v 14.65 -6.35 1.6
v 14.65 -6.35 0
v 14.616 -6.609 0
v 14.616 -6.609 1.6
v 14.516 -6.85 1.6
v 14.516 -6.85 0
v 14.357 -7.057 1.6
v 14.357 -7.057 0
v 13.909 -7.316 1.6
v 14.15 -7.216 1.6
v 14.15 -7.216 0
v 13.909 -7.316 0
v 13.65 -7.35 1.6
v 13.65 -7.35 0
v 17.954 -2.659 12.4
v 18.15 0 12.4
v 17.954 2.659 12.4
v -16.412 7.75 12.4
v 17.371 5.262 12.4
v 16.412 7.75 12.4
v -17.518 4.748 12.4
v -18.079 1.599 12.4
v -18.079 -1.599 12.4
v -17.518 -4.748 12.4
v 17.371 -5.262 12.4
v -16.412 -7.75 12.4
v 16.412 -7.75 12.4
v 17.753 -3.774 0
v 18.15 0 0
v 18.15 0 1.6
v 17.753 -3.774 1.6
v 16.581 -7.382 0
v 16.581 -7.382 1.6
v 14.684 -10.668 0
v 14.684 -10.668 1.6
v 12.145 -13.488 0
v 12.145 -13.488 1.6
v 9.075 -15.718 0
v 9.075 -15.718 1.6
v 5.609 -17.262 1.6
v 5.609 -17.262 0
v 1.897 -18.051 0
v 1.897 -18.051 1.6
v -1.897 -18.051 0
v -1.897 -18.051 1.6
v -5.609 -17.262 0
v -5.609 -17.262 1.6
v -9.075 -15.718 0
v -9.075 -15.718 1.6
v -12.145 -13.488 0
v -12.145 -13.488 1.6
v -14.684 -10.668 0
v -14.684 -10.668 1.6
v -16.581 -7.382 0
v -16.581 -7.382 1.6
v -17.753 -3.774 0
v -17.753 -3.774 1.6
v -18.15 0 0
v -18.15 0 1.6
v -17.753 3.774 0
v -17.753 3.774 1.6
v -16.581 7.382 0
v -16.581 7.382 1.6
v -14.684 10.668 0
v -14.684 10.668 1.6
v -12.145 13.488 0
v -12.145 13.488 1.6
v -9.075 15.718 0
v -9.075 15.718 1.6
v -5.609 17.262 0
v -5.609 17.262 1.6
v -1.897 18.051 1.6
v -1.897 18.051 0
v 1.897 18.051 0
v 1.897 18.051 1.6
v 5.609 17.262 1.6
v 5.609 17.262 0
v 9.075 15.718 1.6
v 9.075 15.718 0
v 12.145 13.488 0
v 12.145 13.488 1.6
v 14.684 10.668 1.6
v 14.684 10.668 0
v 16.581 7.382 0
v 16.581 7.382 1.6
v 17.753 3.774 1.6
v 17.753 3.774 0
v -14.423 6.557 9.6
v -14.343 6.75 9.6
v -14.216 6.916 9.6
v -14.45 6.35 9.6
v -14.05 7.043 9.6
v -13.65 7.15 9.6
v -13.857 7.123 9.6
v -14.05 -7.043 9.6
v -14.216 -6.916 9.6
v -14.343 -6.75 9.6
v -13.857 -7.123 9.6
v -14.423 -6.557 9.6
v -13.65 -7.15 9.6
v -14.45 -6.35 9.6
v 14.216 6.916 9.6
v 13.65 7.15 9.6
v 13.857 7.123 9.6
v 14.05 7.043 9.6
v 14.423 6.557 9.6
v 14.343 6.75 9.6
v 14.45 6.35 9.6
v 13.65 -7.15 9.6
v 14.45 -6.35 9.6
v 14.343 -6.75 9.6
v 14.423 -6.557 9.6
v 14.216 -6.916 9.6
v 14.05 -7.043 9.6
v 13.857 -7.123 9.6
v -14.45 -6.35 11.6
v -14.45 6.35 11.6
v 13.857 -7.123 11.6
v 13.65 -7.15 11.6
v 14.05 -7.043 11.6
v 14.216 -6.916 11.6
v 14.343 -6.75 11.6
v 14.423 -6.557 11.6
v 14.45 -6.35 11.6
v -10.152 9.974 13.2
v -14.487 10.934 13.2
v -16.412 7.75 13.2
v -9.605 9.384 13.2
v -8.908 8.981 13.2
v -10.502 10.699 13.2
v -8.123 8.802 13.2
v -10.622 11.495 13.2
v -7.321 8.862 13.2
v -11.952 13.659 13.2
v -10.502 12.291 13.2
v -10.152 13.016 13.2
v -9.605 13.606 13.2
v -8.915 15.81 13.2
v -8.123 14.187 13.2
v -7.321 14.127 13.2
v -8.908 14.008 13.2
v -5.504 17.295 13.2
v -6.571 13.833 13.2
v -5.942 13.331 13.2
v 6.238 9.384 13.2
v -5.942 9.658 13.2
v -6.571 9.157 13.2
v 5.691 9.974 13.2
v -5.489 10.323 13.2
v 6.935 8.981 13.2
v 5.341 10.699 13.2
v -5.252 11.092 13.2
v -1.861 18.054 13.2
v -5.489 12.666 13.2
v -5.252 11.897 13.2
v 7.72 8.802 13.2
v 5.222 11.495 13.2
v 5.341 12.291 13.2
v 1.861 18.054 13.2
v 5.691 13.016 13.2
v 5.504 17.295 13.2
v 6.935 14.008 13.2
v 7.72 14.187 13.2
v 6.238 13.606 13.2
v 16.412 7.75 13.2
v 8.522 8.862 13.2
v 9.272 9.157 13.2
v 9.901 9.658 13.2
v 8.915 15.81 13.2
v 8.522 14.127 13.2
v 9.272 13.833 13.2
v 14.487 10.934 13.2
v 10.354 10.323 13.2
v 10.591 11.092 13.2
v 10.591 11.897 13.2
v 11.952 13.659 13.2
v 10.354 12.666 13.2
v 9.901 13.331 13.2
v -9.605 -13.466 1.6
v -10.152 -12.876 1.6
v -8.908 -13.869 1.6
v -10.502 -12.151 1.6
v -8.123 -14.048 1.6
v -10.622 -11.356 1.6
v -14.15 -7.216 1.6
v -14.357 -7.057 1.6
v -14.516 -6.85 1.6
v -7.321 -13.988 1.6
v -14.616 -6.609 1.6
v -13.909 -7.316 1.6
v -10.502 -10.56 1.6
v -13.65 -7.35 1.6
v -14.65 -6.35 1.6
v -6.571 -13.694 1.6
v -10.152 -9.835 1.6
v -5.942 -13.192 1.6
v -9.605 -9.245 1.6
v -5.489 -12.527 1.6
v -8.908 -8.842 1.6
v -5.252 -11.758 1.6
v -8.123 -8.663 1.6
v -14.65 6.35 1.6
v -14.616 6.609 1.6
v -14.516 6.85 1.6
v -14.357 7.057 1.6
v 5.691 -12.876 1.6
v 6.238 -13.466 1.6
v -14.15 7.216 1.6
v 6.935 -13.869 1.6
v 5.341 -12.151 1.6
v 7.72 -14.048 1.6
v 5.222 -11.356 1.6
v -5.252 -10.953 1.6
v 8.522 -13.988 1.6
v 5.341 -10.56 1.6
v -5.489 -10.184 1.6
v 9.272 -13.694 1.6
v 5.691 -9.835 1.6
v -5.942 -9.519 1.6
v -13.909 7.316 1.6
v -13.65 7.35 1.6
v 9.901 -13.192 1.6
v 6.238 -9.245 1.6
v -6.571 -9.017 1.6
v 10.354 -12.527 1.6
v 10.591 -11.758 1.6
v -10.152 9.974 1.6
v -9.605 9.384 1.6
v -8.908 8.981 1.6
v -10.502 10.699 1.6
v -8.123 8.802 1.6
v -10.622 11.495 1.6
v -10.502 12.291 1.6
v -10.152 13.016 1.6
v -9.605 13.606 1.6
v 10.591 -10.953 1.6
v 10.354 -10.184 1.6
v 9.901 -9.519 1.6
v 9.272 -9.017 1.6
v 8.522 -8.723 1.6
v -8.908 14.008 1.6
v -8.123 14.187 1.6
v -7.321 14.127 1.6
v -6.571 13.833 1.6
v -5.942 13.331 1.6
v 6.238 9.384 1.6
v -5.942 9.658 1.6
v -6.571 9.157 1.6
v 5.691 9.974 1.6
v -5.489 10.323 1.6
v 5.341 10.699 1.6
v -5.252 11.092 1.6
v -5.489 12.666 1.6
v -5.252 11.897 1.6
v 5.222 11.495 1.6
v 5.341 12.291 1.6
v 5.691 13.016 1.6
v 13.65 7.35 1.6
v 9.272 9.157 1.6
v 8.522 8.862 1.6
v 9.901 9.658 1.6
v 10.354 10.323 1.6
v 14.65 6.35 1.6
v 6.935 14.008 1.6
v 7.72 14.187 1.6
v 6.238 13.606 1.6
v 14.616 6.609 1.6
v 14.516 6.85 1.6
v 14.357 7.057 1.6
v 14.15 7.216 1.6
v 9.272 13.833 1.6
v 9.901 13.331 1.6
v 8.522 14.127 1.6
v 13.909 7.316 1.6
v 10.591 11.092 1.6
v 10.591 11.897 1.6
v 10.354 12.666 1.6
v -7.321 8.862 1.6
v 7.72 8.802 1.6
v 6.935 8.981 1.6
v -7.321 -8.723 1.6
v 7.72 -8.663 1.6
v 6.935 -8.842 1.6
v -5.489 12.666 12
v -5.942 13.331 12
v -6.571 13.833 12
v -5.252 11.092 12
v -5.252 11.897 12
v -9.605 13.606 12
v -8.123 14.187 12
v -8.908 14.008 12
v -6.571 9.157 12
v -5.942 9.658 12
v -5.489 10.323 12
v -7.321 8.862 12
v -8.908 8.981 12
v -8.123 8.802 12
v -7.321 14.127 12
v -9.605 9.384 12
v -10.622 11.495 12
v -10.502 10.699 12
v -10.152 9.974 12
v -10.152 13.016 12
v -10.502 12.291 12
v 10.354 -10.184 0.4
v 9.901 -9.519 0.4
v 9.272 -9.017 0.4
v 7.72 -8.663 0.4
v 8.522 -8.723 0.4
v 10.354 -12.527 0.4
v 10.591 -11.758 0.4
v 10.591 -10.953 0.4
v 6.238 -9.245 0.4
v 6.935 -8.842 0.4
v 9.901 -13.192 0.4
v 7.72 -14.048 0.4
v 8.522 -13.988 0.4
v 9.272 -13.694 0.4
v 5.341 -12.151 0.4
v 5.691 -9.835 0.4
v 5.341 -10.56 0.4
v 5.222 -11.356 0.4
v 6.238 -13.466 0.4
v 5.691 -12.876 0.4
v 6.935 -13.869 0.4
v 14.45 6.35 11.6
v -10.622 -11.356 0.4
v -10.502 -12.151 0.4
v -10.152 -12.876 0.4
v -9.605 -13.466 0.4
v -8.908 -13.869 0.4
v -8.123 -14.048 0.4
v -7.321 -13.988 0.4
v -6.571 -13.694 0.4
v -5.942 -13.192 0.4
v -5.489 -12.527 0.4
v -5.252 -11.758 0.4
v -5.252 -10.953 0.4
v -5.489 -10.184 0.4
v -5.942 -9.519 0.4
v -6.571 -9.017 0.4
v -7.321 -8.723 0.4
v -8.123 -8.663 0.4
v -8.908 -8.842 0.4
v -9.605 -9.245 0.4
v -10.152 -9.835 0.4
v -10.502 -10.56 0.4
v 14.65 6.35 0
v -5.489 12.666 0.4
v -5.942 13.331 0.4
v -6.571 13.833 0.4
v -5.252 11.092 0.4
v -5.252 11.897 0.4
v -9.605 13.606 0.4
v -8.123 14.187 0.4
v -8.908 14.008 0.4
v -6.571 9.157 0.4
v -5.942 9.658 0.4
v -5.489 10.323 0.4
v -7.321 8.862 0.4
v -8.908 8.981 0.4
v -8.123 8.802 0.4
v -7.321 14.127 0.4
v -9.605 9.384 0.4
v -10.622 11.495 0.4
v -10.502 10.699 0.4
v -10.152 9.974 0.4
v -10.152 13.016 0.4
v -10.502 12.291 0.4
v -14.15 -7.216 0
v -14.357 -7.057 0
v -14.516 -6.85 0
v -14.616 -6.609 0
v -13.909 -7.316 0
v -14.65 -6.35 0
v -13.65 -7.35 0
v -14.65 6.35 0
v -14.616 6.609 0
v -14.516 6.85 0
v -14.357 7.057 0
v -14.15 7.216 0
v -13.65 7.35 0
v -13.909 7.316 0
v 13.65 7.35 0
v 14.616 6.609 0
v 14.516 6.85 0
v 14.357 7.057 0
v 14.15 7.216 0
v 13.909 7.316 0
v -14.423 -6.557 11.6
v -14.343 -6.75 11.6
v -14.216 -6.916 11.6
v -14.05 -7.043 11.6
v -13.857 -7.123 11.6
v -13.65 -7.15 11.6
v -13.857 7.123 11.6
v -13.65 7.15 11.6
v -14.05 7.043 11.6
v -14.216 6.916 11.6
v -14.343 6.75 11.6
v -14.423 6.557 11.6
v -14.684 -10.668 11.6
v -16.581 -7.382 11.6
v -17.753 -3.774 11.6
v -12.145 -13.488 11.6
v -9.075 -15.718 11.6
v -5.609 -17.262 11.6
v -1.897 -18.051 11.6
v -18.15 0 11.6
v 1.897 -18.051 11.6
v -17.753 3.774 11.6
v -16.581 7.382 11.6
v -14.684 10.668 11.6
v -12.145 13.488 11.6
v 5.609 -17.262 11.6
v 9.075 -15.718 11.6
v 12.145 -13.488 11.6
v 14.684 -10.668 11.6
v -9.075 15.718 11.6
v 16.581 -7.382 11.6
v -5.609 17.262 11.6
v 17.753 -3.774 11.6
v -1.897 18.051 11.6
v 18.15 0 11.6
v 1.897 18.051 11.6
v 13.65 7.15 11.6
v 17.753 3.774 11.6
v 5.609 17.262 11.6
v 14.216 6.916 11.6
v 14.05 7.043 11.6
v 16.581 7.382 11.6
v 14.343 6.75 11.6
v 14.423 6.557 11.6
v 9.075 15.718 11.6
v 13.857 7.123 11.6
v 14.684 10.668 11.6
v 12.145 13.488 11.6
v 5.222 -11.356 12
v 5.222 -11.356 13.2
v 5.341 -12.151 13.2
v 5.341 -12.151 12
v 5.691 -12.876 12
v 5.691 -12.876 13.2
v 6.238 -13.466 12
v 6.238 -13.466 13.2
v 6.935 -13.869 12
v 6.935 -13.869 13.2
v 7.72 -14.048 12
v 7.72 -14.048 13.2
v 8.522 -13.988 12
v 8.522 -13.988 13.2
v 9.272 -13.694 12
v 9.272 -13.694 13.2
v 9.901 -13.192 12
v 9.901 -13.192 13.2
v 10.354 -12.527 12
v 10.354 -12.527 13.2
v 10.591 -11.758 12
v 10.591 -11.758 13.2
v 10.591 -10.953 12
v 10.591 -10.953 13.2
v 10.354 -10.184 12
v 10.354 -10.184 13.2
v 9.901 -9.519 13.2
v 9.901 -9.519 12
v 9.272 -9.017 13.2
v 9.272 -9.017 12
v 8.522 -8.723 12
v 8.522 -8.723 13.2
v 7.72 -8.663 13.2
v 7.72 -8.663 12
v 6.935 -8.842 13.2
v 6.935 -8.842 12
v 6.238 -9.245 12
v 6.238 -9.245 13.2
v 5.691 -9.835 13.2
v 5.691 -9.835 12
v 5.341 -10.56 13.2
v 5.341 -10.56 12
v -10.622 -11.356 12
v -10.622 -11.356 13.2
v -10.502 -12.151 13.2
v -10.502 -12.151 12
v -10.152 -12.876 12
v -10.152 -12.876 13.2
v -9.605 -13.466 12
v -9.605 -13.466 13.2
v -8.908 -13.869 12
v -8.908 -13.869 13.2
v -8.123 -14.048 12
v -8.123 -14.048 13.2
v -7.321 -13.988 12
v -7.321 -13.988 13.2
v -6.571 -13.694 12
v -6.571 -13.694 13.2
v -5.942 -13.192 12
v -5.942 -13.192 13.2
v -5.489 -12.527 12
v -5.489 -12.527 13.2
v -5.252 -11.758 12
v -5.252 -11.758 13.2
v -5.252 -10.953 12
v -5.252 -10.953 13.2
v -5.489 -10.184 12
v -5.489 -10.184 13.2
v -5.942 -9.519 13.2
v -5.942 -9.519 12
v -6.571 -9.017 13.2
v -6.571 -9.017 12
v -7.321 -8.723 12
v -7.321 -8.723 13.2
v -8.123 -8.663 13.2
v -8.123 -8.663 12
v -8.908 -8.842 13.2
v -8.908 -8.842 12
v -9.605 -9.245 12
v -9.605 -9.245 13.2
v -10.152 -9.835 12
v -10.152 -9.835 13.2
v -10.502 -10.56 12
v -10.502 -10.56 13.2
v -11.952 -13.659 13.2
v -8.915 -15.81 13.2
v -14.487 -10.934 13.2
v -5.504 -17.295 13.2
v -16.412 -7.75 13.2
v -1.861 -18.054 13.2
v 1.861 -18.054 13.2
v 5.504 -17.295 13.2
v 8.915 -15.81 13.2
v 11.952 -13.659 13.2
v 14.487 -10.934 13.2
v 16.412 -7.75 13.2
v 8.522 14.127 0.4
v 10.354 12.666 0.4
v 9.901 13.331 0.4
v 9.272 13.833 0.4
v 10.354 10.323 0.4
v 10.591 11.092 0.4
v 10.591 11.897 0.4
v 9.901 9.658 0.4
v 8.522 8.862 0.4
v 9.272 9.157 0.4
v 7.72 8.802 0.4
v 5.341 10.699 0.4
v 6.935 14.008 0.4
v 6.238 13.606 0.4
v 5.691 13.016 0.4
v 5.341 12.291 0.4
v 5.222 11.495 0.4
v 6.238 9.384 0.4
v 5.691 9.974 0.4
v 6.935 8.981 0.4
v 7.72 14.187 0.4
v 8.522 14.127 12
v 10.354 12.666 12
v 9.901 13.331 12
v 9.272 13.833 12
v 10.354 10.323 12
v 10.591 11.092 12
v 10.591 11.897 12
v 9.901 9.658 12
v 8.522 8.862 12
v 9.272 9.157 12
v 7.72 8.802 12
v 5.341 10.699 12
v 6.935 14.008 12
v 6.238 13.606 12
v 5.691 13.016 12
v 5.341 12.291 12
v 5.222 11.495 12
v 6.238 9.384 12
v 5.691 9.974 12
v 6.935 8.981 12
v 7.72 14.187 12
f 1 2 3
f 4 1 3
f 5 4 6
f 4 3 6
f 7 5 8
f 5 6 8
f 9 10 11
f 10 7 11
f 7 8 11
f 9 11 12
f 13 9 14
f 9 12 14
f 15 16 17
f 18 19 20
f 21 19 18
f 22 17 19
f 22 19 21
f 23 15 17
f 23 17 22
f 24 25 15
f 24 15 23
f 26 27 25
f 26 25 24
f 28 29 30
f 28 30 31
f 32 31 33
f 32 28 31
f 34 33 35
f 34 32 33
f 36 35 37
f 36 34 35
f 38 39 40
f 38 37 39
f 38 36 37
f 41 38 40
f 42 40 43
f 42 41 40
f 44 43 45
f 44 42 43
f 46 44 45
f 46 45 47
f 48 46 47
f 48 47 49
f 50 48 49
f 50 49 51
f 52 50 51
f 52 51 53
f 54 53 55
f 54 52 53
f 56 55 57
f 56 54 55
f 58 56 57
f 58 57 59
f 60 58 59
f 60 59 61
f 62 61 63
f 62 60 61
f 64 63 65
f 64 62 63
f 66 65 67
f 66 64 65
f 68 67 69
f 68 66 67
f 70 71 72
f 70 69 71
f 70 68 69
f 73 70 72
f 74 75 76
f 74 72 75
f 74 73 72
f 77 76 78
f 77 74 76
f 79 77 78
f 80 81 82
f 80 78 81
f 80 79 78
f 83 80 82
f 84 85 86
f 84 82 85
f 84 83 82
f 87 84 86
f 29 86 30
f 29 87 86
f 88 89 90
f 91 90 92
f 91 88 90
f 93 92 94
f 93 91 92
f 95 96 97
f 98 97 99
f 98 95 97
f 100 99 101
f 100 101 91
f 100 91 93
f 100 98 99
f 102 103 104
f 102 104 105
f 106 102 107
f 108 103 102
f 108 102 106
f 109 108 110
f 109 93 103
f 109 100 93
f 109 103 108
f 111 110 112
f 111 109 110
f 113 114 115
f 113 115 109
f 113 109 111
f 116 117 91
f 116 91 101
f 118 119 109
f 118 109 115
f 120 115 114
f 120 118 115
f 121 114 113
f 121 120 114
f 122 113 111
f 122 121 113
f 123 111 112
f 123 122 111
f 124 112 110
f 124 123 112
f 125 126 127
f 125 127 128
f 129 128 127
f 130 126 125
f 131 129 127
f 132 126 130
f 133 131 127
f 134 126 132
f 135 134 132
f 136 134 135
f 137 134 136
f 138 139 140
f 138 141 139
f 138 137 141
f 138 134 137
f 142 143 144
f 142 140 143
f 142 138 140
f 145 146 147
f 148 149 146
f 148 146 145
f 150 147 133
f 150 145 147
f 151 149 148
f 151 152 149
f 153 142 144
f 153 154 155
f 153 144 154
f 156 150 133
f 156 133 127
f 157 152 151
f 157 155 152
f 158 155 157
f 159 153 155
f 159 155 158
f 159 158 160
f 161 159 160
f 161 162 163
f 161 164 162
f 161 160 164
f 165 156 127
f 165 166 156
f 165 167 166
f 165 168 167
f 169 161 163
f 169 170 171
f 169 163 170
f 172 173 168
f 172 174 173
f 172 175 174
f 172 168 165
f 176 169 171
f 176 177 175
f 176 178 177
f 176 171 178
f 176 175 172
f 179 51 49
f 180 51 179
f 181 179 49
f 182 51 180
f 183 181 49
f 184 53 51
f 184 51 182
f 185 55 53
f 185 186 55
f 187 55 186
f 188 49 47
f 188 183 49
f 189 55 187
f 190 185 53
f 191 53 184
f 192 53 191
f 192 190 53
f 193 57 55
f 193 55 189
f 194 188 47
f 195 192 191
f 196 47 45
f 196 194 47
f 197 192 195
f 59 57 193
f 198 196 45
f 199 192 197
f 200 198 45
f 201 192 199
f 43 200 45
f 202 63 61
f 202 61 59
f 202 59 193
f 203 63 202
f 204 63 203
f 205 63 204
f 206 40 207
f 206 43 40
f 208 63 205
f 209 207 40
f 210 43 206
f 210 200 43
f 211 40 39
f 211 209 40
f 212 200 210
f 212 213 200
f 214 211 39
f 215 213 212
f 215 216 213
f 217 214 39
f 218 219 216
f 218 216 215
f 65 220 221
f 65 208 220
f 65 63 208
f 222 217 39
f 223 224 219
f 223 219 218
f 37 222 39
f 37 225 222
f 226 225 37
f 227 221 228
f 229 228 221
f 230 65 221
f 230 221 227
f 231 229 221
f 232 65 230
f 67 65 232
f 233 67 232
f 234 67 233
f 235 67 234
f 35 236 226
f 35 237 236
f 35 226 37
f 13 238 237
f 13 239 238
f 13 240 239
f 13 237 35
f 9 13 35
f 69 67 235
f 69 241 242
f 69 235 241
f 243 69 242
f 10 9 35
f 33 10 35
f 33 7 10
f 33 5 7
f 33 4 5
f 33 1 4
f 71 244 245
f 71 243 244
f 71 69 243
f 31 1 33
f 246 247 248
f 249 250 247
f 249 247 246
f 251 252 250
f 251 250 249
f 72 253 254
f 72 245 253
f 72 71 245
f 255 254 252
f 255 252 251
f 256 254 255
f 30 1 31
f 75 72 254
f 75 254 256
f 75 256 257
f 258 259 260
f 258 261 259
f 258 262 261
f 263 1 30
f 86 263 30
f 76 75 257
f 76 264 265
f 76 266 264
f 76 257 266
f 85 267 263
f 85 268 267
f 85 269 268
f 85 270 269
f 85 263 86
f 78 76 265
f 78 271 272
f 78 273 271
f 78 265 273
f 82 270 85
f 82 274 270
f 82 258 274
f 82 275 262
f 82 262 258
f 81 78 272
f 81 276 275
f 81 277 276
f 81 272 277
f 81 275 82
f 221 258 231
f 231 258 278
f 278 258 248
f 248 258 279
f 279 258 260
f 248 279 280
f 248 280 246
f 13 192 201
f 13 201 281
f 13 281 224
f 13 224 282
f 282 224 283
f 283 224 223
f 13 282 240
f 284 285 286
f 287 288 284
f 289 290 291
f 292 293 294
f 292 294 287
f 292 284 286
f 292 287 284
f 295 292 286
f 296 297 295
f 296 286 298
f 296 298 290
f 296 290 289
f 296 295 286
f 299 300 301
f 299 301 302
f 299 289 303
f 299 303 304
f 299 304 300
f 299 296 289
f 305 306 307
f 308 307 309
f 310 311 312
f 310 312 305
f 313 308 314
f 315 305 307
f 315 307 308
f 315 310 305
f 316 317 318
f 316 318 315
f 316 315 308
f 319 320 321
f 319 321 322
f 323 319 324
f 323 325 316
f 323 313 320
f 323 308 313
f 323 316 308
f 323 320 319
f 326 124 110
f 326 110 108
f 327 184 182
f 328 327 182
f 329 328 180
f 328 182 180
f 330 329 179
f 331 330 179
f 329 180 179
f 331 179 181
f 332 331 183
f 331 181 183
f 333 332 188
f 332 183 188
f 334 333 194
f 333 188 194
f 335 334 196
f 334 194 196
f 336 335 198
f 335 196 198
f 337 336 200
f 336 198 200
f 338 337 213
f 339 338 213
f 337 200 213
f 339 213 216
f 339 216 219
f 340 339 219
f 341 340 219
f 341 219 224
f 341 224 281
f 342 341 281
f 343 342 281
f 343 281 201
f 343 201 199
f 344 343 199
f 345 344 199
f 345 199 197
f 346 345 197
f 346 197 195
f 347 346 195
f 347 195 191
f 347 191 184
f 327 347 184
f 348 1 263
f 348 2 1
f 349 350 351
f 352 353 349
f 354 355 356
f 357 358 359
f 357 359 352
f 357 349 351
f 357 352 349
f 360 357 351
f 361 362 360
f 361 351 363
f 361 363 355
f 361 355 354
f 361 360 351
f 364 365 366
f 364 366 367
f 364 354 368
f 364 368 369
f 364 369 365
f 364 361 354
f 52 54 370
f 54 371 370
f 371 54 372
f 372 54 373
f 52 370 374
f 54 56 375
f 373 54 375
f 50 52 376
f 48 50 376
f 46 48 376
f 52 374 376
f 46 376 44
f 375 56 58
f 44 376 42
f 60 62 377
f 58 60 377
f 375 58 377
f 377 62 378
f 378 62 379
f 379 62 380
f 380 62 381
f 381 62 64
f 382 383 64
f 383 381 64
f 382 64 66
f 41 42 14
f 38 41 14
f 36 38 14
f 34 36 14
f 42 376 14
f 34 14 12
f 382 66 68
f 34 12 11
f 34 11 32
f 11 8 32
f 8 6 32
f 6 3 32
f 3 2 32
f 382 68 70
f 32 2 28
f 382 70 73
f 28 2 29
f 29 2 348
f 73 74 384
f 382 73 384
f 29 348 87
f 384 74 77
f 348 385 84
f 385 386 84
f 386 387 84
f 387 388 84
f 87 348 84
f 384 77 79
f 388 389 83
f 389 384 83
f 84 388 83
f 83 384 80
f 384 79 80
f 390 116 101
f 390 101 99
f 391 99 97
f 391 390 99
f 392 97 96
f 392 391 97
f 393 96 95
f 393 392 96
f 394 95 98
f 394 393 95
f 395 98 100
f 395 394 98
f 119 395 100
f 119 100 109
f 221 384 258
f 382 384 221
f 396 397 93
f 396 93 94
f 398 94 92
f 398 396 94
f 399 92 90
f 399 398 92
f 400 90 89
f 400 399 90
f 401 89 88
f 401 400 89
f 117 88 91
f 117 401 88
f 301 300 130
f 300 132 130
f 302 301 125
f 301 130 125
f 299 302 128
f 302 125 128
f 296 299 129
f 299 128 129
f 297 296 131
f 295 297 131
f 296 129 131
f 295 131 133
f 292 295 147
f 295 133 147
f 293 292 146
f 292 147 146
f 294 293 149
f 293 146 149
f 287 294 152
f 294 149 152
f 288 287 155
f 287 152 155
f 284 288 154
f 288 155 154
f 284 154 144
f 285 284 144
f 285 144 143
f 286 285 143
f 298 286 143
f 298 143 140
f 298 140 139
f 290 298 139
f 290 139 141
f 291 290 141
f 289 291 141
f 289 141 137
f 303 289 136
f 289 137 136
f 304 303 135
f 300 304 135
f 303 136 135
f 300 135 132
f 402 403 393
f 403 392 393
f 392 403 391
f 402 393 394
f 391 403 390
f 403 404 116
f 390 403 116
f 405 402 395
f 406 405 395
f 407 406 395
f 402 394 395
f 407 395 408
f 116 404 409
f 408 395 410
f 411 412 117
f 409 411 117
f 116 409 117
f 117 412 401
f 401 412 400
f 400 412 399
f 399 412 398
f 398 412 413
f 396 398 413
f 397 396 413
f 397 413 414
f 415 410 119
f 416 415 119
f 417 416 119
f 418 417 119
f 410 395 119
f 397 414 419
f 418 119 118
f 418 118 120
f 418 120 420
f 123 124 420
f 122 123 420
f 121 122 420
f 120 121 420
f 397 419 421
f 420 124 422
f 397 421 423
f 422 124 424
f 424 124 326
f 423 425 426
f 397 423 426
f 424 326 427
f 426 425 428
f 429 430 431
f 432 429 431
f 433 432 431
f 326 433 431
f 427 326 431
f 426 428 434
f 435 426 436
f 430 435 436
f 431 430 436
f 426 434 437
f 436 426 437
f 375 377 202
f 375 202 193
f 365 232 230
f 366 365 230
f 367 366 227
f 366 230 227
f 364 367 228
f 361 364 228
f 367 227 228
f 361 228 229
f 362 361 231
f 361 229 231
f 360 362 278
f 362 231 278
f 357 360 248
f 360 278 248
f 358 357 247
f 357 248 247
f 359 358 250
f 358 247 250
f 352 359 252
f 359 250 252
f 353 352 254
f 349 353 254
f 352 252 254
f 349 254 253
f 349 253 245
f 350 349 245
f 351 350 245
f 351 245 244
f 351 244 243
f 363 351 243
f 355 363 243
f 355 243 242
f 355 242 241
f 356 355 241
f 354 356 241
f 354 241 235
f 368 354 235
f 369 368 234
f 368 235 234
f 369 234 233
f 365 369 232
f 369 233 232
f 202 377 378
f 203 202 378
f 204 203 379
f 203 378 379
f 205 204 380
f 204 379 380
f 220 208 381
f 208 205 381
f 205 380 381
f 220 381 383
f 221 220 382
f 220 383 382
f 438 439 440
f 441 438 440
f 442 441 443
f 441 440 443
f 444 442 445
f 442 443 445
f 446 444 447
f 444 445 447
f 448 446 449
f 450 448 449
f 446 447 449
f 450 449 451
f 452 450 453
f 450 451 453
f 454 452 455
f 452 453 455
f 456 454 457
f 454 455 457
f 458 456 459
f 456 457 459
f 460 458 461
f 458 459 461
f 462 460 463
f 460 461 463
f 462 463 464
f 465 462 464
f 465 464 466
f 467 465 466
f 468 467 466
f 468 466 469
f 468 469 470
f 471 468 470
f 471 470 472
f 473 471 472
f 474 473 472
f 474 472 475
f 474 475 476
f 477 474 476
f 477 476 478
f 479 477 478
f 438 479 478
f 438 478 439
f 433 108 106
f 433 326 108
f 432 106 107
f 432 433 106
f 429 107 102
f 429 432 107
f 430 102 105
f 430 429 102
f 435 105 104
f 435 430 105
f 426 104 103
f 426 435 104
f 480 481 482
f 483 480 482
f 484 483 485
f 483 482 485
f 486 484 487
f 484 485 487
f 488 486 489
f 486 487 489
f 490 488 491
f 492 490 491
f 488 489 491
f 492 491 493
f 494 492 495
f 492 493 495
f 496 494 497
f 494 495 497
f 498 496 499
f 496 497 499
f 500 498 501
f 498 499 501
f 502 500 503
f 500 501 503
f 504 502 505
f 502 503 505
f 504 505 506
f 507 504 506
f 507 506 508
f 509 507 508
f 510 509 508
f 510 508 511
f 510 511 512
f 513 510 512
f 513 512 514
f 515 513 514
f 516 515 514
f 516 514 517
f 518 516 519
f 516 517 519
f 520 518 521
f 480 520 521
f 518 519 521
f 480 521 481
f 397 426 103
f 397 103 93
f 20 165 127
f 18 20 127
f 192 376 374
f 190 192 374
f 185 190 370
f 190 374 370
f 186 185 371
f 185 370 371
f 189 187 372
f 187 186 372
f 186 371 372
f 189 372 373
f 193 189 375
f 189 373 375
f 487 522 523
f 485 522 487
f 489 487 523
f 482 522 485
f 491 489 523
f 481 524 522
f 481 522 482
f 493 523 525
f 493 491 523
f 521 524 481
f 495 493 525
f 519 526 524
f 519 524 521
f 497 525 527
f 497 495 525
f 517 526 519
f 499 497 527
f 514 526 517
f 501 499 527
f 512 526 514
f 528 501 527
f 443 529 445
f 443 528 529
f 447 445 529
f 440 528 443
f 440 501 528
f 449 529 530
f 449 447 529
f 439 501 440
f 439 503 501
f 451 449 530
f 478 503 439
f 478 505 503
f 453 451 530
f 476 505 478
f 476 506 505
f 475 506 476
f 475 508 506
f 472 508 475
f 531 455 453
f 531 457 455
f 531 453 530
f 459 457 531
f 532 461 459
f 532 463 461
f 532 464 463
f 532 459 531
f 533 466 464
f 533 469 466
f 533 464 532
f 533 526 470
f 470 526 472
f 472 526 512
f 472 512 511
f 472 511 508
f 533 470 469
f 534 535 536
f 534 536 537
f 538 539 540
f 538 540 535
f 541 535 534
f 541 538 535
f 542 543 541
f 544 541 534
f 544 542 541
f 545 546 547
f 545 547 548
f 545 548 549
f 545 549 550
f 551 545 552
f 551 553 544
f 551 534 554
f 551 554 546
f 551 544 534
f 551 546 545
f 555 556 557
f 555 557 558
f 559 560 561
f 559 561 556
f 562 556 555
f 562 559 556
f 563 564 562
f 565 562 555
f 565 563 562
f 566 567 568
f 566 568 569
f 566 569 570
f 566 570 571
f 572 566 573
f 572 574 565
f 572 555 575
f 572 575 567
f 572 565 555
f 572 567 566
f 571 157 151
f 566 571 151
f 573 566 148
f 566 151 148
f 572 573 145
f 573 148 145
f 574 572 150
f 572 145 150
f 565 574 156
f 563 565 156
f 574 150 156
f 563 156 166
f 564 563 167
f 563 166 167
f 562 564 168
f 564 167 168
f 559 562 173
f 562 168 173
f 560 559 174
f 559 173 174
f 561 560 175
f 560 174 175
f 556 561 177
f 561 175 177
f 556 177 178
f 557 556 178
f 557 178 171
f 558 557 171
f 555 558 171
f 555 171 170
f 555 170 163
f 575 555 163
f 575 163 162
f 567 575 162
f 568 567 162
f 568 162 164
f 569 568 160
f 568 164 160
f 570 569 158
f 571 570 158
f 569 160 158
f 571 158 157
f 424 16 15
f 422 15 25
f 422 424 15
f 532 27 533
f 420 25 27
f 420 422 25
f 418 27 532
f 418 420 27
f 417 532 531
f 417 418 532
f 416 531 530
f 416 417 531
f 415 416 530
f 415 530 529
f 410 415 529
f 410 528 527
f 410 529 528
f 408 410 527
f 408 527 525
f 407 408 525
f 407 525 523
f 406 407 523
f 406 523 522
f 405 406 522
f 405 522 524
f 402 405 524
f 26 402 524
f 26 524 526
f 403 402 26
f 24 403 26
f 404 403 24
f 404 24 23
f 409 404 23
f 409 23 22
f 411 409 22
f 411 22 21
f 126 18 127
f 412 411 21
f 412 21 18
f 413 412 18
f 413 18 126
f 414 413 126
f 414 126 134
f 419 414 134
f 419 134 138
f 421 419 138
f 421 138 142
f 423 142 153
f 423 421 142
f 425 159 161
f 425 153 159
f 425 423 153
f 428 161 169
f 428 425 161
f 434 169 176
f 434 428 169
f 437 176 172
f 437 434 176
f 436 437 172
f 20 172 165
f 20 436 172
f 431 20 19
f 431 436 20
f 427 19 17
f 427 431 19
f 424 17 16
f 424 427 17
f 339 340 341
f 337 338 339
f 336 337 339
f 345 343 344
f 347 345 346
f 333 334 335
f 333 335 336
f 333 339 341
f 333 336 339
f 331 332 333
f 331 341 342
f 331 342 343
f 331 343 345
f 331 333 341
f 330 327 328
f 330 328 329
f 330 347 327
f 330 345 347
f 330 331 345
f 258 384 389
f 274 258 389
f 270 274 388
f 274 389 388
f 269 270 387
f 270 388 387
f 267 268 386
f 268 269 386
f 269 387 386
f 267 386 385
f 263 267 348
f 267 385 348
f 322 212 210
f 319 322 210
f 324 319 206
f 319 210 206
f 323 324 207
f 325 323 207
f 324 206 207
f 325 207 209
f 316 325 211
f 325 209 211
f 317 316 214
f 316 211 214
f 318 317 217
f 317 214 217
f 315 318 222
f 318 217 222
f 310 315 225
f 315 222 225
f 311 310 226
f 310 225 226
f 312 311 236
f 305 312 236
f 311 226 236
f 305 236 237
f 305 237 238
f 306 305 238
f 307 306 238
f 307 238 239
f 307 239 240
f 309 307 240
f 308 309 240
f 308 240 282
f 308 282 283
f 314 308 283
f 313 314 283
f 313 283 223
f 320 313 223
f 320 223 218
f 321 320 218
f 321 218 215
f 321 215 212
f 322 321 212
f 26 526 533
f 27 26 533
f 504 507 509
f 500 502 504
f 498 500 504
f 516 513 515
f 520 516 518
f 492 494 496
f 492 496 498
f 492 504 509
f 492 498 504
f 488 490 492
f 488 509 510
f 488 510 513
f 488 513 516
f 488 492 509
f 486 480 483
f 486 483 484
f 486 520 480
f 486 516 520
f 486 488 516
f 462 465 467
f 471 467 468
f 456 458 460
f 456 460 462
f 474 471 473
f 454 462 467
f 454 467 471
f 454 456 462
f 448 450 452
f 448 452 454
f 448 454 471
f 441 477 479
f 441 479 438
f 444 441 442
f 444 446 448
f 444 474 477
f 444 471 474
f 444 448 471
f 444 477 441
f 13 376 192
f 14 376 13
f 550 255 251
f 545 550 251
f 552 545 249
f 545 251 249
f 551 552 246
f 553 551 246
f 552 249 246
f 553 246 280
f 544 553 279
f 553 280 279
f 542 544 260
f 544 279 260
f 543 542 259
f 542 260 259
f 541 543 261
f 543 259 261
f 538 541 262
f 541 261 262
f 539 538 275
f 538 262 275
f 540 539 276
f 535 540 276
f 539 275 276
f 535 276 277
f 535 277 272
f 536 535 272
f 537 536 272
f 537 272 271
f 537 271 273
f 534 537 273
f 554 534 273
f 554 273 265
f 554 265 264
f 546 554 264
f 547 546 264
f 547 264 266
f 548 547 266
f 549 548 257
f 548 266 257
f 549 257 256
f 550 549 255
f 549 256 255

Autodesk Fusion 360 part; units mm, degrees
sketch "Sketch1" plane through (0, 0, 0) normal (0, 0, 1) x (1, 0, 0) in component "Button"
  circle A0 centre (0, 0) radius 18.15
  line L0 (13.65, 7.35) -> (-13.65, 7.35)
  line L1 (-14.65, 6.35) -> (-14.65, -6.35)
  line L2 (-13.65, -7.35) -> (13.65, -7.35)
  line L3 (14.65, -6.35) -> (14.65, 6.35)
  line L4 (14.65, 7.35) -> (-14.65, -7.35) construction
  line L5 (-14.65, 7.35) -> (14.65, -7.35) construction
  arc A1 (14.65, 6.35) -> (13.65, 7.35) centre (13.65, 6.35) ccw
  arc A2 (13.65, -7.35) -> (14.65, -6.35) centre (13.65, -6.35) ccw
  arc A3 (-14.65, -6.35) -> (-13.65, -7.35) centre (-13.65, -6.35) ccw
  arc A4 (-13.65, 7.35) -> (-14.65, 6.35) centre (-13.65, 6.35) ccw
  dimension "d1" = 36.3
  dimension "d2" = 29.3
  dimension "d3" = 14.7
  dimension "d4" = 1
  dimension "d5" = 1
  dimension "d6" = 1
  dimension "d7" = 1
extrude "Extrude1" add sketch "Sketch1" along normal blind 1.6 makes body 1 in component "Button"
sketch "Sketch2" plane through (0, 0, 1.6) normal (0, 0, 1) x (-1, 0, 0) in component "Button"
  arc A0 (13.65, -7.35) -> (14.65, -6.35) centre (13.65, -6.35) ccw
  line L0 (13.65, -7.35) -> (-13.65, -7.35)
  arc A1 (-14.65, -6.35) -> (-13.65, -7.35) centre (-13.65, -6.35) ccw
  line L1 (-14.65, -6.35) -> (-14.65, 6.35)
  arc A2 (-13.65, 7.35) -> (-14.65, 6.35) centre (-13.65, 6.35) ccw
  line L2 (-13.65, 7.35) -> (13.65, 7.35)
  arc A3 (14.65, 6.35) -> (13.65, 7.35) centre (13.65, 6.35) ccw
  line L3 (14.65, 6.35) -> (14.65, -6.35)
  circle A4 centre (0, 0) radius 18.15
  circle A5 centre (7.9215, -11.4948) radius 2.7
  line L4 (0, -18.15) -> (0, 18.15) construction
  line L5 (18.1499, -0.0697) -> (-18.1499, -0.0697) construction
  circle A6 centre (-7.9215, -11.4948) radius 2.7
  circle A7 centre (7.9215, 11.3555) radius 2.7
  circle A8 centre (-7.9215, 11.3555) radius 2.7
  dimension "d10" = 5.4
extrude "Extrude2" cut sketch "Sketch2" against normal blind 1.2 contours A5 | A6 | A7 | A8 bodies 1 in component "Button"
copy_body "CutPasteBodies1" bodies 1 removing the originals makes body 2 in component "Button"
ref_plane "WorkPlane1" through (0, 0, 11.6) normal (0, 0, 1) x (-1, 0, 0) in component "Wall plate (1)"
sketch "Sketch3" plane through (0, 0, 11.6) normal (0, 0, 1) x (1, 0, 0) in component "Wall plate (1)"
  circle A0 centre (0, 0) radius 18.15
extrude "Extrude1'" add sketch "Sketch3" along normal blind 1.6 separate body makes body 3 in component "Wall plate (1)"
sketch "Sketch4" plane through (0, 0, 11.6) normal (0, 0, -1) x (1, 0, 0) in component "Wall plate (1)"
  circle A0 centre (0, 0) radius 18.15
  arc A1 (-14.65, -6.35) -> (-13.65, -7.35) centre (-13.65, -6.35) ccw
  line L0 (-14.65, -6.35) -> (-14.65, 6.35)
  arc A2 (-13.65, 7.35) -> (-14.65, 6.35) centre (-13.65, 6.35) ccw
  line L1 (-13.65, 7.35) -> (13.65, 7.35)
  arc A3 (14.65, 6.35) -> (13.65, 7.35) centre (13.65, 6.35) ccw
  line L2 (14.65, 6.35) -> (14.65, -6.35)
  arc A4 (13.65, -7.35) -> (14.65, -6.35) centre (13.65, -6.35) ccw
  line L3 (13.65, -7.35) -> (-13.65, -7.35)
  circle A5 centre (0, 0) radius 18.15
  line L4 (-13.65, 7.15) -> (13.65, 7.15)
  arc A6 (14.45, 6.35) -> (13.65, 7.15) centre (13.65, 6.35) ccw
  line L5 (14.45, 6.35) -> (14.45, -6.35)
  arc A7 (13.65, -7.15) -> (14.45, -6.35) centre (13.65, -6.35) ccw
  line L6 (13.65, -7.15) -> (-13.65, -7.15)
  arc A8 (-14.45, -6.35) -> (-13.65, -7.15) centre (-13.65, -6.35) ccw
  line L7 (-14.45, -6.35) -> (-14.45, 6.35)
  arc A9 (-13.65, 7.15) -> (-14.45, 6.35) centre (-13.65, 6.35) ccw
  dimension "d31" = -0.2
extrude "Extrude2'" add sketch "Sketch4" along normal blind 2 contours L4 A6 L5 A7 L6 A8 L7 A9 bodies 3 in component "Wall plate (1)"
sketch "Sketch5" plane through (0, 0, 13.2) normal (0, 0, 1) x (-1, 0, 0) in component "Wall plate (1)"
  circle A0 centre (0, 0) radius 18.15
  circle A1 centre (-7.9215, 11.3555) radius 2.7
  circle A2 centre (7.9215, 11.3555) radius 2.7
  circle A3 centre (7.9215, -11.4948) radius 2.7
  circle A4 centre (-7.9215, -11.4948) radius 2.7
  line L0 (-23.5, -7.75) -> (23.5, -7.75)
  line L1 (23.5, -7.75) -> (23.5, 7.75)
  line L2 (23.5, 7.75) -> (-23.5, 7.75)
  line L3 (-23.5, 7.75) -> (-23.5, -7.75)
  line L4 (-23.5, -7.75) -> (23.5, 7.75) construction
  line L5 (23.5, -7.75) -> (-23.5, 7.75) construction
  dimension "d36" = 47
  dimension "d37" = 15.5
extrude "Extrude3" cut sketch "Sketch5" against normal blind 1.2 contours A1 | A2 | A3 | A4 bodies 3 in component "Wall plate (1)"
extrude "Extrude4" cut sketch "Sketch5" against normal blind 0.8 contours A0 L0 L2 bodies 3 in component "Wall plate (1)"
sketch "Sketch2 (2)" plane through (0, 0, 11.6) normal (0, 0, 1) x (1, 0, 0) in component "Wall plate (1)"
  circle A0 centre (7.9215, 11.4948) radius 2.7
  circle A1 centre (7.9215, -11.3555) radius 2.7
  circle A2 centre (-7.9215, 11.4948) radius 2.7
  circle A3 centre (-7.9215, -11.3555) radius 2.7
  arc A4 (-13.65, 7.35) -> (-14.65, 6.35) centre (-13.65, 6.35) ccw
  line L0 (-13.65, 7.35) -> (13.65, 7.35)
  arc A5 (14.65, 6.35) -> (13.65, 7.35) centre (13.65, 6.35) ccw
  line L1 (14.65, 6.35) -> (14.65, -6.35)
  arc A6 (13.65, -7.35) -> (14.65, -6.35) centre (13.65, -6.35) ccw
  line L2 (13.65, -7.35) -> (-13.65, -7.35)
  arc A7 (-14.65, -6.35) -> (-13.65, -7.35) centre (-13.65, -6.35) ccw
  line L3 (-14.65, -6.35) -> (-14.65, 6.35)
  circle A8 centre (0, 0) radius 18.15
  arc A9 (14.45, 6.35) -> (13.65, 7.15) centre (13.65, 6.35) ccw
  line L4 (-13.65, 7.15) -> (13.65, 7.15)
  arc A10 (-13.65, 7.15) -> (-14.45, 6.35) centre (-13.65, 6.35) ccw
  line L5 (-14.45, -6.35) -> (-14.45, 6.35)
  arc A11 (-14.45, -6.35) -> (-13.65, -7.15) centre (-13.65, -6.35) ccw
  line L6 (13.65, -7.15) -> (-13.65, -7.15)
  arc A12 (13.65, -7.15) -> (14.45, -6.35) centre (13.65, -6.35) ccw
  line L7 (14.45, 6.35) -> (14.45, -6.35)
  dimension "d28" = 0.2
sketch "Sketch1 (2)" plane through (0, 0, 1.6) normal (0, 0, 1) x (-1, 0, 0) in component "Wall plate (1)"
component "Button" placed x (1, 0, 0) y (0, 1, 0) z (0, 0, 1) at (0, 0, 0)
component "Wall plate (1)" placed x (1, 0, 0) y (0, 1, 0) z (0, 0, 1) at (0, 0, 0)
properties part number "Wall plate"
